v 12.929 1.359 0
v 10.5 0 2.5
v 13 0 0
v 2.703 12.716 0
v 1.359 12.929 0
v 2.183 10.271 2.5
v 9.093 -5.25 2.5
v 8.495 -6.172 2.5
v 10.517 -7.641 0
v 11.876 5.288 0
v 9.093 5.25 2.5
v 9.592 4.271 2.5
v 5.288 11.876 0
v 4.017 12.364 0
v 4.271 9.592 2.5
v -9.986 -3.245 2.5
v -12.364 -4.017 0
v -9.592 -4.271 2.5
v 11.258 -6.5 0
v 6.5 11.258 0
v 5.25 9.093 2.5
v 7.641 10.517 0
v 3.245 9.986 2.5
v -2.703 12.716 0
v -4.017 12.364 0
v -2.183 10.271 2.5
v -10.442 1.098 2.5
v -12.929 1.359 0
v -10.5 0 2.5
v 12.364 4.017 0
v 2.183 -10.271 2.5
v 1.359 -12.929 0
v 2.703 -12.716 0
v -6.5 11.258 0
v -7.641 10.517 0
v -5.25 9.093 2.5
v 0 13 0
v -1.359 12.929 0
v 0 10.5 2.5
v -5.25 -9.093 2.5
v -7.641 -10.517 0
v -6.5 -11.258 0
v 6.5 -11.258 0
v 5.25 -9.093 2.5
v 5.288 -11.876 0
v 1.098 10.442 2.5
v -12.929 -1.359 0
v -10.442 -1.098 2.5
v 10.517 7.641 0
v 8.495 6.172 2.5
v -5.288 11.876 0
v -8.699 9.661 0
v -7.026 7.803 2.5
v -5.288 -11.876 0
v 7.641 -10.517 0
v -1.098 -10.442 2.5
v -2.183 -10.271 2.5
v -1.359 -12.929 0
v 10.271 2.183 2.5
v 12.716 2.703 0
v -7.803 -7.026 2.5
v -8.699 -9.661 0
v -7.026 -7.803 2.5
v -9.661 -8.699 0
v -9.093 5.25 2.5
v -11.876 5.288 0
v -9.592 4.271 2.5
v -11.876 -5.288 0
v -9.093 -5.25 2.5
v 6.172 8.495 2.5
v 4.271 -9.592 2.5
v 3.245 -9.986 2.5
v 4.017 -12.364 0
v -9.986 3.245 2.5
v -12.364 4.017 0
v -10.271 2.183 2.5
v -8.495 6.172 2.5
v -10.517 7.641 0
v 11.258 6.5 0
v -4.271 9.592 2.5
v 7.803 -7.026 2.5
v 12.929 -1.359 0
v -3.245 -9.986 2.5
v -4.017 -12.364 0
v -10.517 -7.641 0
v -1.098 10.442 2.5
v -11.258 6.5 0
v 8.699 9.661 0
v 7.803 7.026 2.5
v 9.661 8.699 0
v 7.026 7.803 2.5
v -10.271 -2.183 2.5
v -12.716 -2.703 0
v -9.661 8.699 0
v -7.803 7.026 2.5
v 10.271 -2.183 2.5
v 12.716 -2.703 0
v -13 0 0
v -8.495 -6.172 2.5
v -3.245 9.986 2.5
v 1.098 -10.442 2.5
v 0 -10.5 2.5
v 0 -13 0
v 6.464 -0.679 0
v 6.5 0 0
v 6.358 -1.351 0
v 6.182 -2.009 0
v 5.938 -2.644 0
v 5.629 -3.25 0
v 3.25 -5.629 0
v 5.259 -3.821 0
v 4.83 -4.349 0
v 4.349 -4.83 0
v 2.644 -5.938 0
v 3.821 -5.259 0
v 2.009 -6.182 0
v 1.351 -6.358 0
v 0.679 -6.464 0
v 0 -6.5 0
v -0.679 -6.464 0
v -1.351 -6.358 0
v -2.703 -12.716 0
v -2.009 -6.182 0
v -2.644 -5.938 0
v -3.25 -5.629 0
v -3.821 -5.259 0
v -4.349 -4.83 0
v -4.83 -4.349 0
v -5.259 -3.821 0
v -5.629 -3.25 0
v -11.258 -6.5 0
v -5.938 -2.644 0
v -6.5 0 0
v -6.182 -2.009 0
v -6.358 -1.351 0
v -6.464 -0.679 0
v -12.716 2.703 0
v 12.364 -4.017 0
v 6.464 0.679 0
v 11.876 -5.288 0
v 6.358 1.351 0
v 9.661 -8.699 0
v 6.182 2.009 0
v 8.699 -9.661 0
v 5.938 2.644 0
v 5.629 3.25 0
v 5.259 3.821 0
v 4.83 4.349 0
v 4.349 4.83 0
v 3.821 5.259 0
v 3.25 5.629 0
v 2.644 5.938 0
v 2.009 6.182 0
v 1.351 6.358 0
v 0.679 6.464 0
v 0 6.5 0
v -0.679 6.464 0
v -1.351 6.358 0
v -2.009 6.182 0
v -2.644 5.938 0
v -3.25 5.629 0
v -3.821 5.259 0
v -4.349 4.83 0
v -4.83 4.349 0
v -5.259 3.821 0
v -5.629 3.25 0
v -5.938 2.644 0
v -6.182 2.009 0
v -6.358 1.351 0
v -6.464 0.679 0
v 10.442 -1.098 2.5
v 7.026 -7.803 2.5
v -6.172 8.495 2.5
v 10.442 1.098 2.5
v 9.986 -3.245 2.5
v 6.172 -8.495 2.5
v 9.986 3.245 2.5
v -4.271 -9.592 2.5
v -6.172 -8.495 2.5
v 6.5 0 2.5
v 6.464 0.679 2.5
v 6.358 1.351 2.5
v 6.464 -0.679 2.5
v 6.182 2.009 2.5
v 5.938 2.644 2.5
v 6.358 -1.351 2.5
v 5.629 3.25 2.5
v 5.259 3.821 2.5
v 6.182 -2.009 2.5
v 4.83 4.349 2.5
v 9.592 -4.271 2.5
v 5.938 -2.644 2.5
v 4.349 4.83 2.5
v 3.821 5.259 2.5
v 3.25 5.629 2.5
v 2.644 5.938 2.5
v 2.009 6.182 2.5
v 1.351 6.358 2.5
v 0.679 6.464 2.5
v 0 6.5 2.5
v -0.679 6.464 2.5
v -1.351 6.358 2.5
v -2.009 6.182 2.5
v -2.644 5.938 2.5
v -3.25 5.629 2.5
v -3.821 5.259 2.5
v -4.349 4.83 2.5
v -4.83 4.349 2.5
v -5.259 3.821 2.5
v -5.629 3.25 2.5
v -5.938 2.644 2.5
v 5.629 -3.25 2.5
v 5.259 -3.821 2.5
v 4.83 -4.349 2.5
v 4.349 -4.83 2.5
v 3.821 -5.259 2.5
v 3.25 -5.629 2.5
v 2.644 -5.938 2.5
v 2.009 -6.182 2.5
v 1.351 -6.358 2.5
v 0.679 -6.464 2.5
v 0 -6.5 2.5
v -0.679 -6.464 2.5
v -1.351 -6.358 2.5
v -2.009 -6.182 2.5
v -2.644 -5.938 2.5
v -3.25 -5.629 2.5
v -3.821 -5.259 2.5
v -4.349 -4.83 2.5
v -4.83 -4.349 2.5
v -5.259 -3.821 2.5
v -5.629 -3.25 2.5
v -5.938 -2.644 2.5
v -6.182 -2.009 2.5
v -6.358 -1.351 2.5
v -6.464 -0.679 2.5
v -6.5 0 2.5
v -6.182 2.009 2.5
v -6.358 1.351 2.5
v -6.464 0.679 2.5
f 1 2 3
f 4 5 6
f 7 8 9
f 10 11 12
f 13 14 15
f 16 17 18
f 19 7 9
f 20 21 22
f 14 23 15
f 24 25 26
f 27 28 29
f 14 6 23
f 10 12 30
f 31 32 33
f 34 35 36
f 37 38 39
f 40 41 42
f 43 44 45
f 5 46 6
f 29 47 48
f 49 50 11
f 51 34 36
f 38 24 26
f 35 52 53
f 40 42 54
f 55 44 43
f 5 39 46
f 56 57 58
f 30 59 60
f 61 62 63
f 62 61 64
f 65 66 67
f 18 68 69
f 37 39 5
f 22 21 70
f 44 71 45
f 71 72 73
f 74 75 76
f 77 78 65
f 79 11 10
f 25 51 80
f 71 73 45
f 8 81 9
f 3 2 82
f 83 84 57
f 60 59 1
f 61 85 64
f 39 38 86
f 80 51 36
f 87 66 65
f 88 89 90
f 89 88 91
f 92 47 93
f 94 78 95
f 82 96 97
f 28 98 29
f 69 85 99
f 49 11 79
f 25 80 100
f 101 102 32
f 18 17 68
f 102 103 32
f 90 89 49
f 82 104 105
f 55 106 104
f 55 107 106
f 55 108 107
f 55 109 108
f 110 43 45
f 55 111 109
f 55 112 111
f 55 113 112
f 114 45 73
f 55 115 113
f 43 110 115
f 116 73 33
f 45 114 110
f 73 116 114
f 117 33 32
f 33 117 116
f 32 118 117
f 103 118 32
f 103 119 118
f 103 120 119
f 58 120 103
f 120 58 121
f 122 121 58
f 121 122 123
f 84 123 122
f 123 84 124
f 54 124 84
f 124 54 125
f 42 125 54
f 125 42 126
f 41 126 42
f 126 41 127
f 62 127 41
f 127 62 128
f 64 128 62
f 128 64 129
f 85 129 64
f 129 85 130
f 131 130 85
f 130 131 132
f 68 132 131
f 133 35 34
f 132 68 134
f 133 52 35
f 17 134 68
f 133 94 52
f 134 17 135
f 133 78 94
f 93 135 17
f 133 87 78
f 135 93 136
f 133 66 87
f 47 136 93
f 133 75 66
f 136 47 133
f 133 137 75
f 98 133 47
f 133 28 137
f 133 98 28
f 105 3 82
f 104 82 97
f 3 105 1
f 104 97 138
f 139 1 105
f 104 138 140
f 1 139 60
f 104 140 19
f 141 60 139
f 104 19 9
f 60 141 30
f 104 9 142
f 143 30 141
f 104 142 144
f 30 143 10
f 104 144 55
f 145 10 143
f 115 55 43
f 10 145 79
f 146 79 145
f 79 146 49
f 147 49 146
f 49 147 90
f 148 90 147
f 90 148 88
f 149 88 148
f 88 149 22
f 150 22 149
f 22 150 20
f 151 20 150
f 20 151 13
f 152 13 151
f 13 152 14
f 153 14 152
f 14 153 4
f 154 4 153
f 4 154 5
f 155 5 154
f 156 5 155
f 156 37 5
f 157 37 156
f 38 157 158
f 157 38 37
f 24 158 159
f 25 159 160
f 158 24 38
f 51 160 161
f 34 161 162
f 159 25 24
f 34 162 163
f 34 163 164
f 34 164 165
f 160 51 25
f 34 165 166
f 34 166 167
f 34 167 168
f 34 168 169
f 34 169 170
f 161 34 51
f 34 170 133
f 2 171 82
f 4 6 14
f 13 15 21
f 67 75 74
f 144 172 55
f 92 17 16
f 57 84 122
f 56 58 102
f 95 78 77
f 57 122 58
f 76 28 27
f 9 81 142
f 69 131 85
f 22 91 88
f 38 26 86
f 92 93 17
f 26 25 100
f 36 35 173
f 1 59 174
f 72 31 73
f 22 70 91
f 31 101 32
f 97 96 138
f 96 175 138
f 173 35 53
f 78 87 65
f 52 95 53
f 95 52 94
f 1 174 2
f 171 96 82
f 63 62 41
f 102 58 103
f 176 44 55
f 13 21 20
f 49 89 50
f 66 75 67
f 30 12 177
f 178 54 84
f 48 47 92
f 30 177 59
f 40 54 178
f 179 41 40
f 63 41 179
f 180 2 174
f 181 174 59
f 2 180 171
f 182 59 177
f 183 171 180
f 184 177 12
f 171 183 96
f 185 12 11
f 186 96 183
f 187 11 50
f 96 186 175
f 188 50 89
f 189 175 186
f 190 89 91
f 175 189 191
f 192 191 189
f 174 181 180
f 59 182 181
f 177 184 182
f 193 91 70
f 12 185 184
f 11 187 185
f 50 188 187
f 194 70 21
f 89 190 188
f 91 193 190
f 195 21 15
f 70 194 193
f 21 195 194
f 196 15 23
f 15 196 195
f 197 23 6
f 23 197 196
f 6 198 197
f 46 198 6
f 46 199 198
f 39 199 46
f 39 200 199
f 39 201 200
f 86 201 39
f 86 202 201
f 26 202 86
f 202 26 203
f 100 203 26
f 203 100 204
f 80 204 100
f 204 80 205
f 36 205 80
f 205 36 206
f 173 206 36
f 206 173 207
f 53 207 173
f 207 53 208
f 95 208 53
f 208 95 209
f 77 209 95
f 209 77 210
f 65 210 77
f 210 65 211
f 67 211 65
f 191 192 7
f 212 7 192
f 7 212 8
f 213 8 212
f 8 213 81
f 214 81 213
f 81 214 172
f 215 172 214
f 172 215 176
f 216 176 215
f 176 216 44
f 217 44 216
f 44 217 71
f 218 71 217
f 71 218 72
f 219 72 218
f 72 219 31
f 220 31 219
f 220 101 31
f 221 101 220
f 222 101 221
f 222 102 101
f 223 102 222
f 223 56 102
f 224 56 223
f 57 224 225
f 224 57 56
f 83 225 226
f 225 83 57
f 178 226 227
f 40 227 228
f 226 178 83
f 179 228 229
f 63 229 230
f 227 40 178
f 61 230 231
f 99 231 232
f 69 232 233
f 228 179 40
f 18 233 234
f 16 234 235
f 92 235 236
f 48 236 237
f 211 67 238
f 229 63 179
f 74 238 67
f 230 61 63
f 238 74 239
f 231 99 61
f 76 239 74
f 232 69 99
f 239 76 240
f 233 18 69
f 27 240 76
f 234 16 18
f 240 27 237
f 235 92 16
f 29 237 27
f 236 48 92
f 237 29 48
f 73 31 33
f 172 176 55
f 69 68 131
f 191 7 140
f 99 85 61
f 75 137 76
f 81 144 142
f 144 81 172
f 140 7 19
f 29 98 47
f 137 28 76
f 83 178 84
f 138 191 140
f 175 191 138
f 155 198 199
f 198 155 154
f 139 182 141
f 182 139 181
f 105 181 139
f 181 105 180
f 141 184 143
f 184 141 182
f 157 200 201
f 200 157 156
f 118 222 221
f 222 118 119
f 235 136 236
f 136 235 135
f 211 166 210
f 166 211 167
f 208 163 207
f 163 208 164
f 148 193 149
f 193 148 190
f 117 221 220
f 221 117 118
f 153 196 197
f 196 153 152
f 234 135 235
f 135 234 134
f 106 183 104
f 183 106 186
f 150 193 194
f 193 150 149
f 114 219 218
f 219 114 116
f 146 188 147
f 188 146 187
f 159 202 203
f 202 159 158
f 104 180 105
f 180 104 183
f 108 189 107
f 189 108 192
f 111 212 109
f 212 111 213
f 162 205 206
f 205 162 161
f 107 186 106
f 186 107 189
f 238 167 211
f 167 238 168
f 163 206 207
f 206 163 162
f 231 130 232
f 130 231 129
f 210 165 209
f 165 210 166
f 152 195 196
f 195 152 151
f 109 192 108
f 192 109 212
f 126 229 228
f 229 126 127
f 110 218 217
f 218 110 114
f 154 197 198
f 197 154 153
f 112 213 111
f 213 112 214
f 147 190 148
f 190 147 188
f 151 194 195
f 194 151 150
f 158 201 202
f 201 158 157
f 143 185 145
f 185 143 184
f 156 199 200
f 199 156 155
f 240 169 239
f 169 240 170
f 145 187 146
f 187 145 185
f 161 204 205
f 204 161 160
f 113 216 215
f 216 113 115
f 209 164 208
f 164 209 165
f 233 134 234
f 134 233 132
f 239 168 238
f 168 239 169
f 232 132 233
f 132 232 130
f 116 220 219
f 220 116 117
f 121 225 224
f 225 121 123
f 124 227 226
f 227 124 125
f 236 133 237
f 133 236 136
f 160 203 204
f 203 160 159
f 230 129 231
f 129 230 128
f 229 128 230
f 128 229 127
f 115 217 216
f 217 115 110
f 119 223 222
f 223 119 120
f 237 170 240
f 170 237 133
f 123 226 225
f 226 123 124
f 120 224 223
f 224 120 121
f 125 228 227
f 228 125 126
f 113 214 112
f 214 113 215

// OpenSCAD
// Conical spring washer.
$fn = 60;
eps = 0.02;
inner_d = 13;
outer_d = 26;
thickness = 2.5;
difference() {
    cylinder(d1=outer_d,d2=outer_d-2*thickness,h=thickness);
    translate([0,0,-eps]) cylinder(d=inner_d,h=thickness+2*eps);
}
